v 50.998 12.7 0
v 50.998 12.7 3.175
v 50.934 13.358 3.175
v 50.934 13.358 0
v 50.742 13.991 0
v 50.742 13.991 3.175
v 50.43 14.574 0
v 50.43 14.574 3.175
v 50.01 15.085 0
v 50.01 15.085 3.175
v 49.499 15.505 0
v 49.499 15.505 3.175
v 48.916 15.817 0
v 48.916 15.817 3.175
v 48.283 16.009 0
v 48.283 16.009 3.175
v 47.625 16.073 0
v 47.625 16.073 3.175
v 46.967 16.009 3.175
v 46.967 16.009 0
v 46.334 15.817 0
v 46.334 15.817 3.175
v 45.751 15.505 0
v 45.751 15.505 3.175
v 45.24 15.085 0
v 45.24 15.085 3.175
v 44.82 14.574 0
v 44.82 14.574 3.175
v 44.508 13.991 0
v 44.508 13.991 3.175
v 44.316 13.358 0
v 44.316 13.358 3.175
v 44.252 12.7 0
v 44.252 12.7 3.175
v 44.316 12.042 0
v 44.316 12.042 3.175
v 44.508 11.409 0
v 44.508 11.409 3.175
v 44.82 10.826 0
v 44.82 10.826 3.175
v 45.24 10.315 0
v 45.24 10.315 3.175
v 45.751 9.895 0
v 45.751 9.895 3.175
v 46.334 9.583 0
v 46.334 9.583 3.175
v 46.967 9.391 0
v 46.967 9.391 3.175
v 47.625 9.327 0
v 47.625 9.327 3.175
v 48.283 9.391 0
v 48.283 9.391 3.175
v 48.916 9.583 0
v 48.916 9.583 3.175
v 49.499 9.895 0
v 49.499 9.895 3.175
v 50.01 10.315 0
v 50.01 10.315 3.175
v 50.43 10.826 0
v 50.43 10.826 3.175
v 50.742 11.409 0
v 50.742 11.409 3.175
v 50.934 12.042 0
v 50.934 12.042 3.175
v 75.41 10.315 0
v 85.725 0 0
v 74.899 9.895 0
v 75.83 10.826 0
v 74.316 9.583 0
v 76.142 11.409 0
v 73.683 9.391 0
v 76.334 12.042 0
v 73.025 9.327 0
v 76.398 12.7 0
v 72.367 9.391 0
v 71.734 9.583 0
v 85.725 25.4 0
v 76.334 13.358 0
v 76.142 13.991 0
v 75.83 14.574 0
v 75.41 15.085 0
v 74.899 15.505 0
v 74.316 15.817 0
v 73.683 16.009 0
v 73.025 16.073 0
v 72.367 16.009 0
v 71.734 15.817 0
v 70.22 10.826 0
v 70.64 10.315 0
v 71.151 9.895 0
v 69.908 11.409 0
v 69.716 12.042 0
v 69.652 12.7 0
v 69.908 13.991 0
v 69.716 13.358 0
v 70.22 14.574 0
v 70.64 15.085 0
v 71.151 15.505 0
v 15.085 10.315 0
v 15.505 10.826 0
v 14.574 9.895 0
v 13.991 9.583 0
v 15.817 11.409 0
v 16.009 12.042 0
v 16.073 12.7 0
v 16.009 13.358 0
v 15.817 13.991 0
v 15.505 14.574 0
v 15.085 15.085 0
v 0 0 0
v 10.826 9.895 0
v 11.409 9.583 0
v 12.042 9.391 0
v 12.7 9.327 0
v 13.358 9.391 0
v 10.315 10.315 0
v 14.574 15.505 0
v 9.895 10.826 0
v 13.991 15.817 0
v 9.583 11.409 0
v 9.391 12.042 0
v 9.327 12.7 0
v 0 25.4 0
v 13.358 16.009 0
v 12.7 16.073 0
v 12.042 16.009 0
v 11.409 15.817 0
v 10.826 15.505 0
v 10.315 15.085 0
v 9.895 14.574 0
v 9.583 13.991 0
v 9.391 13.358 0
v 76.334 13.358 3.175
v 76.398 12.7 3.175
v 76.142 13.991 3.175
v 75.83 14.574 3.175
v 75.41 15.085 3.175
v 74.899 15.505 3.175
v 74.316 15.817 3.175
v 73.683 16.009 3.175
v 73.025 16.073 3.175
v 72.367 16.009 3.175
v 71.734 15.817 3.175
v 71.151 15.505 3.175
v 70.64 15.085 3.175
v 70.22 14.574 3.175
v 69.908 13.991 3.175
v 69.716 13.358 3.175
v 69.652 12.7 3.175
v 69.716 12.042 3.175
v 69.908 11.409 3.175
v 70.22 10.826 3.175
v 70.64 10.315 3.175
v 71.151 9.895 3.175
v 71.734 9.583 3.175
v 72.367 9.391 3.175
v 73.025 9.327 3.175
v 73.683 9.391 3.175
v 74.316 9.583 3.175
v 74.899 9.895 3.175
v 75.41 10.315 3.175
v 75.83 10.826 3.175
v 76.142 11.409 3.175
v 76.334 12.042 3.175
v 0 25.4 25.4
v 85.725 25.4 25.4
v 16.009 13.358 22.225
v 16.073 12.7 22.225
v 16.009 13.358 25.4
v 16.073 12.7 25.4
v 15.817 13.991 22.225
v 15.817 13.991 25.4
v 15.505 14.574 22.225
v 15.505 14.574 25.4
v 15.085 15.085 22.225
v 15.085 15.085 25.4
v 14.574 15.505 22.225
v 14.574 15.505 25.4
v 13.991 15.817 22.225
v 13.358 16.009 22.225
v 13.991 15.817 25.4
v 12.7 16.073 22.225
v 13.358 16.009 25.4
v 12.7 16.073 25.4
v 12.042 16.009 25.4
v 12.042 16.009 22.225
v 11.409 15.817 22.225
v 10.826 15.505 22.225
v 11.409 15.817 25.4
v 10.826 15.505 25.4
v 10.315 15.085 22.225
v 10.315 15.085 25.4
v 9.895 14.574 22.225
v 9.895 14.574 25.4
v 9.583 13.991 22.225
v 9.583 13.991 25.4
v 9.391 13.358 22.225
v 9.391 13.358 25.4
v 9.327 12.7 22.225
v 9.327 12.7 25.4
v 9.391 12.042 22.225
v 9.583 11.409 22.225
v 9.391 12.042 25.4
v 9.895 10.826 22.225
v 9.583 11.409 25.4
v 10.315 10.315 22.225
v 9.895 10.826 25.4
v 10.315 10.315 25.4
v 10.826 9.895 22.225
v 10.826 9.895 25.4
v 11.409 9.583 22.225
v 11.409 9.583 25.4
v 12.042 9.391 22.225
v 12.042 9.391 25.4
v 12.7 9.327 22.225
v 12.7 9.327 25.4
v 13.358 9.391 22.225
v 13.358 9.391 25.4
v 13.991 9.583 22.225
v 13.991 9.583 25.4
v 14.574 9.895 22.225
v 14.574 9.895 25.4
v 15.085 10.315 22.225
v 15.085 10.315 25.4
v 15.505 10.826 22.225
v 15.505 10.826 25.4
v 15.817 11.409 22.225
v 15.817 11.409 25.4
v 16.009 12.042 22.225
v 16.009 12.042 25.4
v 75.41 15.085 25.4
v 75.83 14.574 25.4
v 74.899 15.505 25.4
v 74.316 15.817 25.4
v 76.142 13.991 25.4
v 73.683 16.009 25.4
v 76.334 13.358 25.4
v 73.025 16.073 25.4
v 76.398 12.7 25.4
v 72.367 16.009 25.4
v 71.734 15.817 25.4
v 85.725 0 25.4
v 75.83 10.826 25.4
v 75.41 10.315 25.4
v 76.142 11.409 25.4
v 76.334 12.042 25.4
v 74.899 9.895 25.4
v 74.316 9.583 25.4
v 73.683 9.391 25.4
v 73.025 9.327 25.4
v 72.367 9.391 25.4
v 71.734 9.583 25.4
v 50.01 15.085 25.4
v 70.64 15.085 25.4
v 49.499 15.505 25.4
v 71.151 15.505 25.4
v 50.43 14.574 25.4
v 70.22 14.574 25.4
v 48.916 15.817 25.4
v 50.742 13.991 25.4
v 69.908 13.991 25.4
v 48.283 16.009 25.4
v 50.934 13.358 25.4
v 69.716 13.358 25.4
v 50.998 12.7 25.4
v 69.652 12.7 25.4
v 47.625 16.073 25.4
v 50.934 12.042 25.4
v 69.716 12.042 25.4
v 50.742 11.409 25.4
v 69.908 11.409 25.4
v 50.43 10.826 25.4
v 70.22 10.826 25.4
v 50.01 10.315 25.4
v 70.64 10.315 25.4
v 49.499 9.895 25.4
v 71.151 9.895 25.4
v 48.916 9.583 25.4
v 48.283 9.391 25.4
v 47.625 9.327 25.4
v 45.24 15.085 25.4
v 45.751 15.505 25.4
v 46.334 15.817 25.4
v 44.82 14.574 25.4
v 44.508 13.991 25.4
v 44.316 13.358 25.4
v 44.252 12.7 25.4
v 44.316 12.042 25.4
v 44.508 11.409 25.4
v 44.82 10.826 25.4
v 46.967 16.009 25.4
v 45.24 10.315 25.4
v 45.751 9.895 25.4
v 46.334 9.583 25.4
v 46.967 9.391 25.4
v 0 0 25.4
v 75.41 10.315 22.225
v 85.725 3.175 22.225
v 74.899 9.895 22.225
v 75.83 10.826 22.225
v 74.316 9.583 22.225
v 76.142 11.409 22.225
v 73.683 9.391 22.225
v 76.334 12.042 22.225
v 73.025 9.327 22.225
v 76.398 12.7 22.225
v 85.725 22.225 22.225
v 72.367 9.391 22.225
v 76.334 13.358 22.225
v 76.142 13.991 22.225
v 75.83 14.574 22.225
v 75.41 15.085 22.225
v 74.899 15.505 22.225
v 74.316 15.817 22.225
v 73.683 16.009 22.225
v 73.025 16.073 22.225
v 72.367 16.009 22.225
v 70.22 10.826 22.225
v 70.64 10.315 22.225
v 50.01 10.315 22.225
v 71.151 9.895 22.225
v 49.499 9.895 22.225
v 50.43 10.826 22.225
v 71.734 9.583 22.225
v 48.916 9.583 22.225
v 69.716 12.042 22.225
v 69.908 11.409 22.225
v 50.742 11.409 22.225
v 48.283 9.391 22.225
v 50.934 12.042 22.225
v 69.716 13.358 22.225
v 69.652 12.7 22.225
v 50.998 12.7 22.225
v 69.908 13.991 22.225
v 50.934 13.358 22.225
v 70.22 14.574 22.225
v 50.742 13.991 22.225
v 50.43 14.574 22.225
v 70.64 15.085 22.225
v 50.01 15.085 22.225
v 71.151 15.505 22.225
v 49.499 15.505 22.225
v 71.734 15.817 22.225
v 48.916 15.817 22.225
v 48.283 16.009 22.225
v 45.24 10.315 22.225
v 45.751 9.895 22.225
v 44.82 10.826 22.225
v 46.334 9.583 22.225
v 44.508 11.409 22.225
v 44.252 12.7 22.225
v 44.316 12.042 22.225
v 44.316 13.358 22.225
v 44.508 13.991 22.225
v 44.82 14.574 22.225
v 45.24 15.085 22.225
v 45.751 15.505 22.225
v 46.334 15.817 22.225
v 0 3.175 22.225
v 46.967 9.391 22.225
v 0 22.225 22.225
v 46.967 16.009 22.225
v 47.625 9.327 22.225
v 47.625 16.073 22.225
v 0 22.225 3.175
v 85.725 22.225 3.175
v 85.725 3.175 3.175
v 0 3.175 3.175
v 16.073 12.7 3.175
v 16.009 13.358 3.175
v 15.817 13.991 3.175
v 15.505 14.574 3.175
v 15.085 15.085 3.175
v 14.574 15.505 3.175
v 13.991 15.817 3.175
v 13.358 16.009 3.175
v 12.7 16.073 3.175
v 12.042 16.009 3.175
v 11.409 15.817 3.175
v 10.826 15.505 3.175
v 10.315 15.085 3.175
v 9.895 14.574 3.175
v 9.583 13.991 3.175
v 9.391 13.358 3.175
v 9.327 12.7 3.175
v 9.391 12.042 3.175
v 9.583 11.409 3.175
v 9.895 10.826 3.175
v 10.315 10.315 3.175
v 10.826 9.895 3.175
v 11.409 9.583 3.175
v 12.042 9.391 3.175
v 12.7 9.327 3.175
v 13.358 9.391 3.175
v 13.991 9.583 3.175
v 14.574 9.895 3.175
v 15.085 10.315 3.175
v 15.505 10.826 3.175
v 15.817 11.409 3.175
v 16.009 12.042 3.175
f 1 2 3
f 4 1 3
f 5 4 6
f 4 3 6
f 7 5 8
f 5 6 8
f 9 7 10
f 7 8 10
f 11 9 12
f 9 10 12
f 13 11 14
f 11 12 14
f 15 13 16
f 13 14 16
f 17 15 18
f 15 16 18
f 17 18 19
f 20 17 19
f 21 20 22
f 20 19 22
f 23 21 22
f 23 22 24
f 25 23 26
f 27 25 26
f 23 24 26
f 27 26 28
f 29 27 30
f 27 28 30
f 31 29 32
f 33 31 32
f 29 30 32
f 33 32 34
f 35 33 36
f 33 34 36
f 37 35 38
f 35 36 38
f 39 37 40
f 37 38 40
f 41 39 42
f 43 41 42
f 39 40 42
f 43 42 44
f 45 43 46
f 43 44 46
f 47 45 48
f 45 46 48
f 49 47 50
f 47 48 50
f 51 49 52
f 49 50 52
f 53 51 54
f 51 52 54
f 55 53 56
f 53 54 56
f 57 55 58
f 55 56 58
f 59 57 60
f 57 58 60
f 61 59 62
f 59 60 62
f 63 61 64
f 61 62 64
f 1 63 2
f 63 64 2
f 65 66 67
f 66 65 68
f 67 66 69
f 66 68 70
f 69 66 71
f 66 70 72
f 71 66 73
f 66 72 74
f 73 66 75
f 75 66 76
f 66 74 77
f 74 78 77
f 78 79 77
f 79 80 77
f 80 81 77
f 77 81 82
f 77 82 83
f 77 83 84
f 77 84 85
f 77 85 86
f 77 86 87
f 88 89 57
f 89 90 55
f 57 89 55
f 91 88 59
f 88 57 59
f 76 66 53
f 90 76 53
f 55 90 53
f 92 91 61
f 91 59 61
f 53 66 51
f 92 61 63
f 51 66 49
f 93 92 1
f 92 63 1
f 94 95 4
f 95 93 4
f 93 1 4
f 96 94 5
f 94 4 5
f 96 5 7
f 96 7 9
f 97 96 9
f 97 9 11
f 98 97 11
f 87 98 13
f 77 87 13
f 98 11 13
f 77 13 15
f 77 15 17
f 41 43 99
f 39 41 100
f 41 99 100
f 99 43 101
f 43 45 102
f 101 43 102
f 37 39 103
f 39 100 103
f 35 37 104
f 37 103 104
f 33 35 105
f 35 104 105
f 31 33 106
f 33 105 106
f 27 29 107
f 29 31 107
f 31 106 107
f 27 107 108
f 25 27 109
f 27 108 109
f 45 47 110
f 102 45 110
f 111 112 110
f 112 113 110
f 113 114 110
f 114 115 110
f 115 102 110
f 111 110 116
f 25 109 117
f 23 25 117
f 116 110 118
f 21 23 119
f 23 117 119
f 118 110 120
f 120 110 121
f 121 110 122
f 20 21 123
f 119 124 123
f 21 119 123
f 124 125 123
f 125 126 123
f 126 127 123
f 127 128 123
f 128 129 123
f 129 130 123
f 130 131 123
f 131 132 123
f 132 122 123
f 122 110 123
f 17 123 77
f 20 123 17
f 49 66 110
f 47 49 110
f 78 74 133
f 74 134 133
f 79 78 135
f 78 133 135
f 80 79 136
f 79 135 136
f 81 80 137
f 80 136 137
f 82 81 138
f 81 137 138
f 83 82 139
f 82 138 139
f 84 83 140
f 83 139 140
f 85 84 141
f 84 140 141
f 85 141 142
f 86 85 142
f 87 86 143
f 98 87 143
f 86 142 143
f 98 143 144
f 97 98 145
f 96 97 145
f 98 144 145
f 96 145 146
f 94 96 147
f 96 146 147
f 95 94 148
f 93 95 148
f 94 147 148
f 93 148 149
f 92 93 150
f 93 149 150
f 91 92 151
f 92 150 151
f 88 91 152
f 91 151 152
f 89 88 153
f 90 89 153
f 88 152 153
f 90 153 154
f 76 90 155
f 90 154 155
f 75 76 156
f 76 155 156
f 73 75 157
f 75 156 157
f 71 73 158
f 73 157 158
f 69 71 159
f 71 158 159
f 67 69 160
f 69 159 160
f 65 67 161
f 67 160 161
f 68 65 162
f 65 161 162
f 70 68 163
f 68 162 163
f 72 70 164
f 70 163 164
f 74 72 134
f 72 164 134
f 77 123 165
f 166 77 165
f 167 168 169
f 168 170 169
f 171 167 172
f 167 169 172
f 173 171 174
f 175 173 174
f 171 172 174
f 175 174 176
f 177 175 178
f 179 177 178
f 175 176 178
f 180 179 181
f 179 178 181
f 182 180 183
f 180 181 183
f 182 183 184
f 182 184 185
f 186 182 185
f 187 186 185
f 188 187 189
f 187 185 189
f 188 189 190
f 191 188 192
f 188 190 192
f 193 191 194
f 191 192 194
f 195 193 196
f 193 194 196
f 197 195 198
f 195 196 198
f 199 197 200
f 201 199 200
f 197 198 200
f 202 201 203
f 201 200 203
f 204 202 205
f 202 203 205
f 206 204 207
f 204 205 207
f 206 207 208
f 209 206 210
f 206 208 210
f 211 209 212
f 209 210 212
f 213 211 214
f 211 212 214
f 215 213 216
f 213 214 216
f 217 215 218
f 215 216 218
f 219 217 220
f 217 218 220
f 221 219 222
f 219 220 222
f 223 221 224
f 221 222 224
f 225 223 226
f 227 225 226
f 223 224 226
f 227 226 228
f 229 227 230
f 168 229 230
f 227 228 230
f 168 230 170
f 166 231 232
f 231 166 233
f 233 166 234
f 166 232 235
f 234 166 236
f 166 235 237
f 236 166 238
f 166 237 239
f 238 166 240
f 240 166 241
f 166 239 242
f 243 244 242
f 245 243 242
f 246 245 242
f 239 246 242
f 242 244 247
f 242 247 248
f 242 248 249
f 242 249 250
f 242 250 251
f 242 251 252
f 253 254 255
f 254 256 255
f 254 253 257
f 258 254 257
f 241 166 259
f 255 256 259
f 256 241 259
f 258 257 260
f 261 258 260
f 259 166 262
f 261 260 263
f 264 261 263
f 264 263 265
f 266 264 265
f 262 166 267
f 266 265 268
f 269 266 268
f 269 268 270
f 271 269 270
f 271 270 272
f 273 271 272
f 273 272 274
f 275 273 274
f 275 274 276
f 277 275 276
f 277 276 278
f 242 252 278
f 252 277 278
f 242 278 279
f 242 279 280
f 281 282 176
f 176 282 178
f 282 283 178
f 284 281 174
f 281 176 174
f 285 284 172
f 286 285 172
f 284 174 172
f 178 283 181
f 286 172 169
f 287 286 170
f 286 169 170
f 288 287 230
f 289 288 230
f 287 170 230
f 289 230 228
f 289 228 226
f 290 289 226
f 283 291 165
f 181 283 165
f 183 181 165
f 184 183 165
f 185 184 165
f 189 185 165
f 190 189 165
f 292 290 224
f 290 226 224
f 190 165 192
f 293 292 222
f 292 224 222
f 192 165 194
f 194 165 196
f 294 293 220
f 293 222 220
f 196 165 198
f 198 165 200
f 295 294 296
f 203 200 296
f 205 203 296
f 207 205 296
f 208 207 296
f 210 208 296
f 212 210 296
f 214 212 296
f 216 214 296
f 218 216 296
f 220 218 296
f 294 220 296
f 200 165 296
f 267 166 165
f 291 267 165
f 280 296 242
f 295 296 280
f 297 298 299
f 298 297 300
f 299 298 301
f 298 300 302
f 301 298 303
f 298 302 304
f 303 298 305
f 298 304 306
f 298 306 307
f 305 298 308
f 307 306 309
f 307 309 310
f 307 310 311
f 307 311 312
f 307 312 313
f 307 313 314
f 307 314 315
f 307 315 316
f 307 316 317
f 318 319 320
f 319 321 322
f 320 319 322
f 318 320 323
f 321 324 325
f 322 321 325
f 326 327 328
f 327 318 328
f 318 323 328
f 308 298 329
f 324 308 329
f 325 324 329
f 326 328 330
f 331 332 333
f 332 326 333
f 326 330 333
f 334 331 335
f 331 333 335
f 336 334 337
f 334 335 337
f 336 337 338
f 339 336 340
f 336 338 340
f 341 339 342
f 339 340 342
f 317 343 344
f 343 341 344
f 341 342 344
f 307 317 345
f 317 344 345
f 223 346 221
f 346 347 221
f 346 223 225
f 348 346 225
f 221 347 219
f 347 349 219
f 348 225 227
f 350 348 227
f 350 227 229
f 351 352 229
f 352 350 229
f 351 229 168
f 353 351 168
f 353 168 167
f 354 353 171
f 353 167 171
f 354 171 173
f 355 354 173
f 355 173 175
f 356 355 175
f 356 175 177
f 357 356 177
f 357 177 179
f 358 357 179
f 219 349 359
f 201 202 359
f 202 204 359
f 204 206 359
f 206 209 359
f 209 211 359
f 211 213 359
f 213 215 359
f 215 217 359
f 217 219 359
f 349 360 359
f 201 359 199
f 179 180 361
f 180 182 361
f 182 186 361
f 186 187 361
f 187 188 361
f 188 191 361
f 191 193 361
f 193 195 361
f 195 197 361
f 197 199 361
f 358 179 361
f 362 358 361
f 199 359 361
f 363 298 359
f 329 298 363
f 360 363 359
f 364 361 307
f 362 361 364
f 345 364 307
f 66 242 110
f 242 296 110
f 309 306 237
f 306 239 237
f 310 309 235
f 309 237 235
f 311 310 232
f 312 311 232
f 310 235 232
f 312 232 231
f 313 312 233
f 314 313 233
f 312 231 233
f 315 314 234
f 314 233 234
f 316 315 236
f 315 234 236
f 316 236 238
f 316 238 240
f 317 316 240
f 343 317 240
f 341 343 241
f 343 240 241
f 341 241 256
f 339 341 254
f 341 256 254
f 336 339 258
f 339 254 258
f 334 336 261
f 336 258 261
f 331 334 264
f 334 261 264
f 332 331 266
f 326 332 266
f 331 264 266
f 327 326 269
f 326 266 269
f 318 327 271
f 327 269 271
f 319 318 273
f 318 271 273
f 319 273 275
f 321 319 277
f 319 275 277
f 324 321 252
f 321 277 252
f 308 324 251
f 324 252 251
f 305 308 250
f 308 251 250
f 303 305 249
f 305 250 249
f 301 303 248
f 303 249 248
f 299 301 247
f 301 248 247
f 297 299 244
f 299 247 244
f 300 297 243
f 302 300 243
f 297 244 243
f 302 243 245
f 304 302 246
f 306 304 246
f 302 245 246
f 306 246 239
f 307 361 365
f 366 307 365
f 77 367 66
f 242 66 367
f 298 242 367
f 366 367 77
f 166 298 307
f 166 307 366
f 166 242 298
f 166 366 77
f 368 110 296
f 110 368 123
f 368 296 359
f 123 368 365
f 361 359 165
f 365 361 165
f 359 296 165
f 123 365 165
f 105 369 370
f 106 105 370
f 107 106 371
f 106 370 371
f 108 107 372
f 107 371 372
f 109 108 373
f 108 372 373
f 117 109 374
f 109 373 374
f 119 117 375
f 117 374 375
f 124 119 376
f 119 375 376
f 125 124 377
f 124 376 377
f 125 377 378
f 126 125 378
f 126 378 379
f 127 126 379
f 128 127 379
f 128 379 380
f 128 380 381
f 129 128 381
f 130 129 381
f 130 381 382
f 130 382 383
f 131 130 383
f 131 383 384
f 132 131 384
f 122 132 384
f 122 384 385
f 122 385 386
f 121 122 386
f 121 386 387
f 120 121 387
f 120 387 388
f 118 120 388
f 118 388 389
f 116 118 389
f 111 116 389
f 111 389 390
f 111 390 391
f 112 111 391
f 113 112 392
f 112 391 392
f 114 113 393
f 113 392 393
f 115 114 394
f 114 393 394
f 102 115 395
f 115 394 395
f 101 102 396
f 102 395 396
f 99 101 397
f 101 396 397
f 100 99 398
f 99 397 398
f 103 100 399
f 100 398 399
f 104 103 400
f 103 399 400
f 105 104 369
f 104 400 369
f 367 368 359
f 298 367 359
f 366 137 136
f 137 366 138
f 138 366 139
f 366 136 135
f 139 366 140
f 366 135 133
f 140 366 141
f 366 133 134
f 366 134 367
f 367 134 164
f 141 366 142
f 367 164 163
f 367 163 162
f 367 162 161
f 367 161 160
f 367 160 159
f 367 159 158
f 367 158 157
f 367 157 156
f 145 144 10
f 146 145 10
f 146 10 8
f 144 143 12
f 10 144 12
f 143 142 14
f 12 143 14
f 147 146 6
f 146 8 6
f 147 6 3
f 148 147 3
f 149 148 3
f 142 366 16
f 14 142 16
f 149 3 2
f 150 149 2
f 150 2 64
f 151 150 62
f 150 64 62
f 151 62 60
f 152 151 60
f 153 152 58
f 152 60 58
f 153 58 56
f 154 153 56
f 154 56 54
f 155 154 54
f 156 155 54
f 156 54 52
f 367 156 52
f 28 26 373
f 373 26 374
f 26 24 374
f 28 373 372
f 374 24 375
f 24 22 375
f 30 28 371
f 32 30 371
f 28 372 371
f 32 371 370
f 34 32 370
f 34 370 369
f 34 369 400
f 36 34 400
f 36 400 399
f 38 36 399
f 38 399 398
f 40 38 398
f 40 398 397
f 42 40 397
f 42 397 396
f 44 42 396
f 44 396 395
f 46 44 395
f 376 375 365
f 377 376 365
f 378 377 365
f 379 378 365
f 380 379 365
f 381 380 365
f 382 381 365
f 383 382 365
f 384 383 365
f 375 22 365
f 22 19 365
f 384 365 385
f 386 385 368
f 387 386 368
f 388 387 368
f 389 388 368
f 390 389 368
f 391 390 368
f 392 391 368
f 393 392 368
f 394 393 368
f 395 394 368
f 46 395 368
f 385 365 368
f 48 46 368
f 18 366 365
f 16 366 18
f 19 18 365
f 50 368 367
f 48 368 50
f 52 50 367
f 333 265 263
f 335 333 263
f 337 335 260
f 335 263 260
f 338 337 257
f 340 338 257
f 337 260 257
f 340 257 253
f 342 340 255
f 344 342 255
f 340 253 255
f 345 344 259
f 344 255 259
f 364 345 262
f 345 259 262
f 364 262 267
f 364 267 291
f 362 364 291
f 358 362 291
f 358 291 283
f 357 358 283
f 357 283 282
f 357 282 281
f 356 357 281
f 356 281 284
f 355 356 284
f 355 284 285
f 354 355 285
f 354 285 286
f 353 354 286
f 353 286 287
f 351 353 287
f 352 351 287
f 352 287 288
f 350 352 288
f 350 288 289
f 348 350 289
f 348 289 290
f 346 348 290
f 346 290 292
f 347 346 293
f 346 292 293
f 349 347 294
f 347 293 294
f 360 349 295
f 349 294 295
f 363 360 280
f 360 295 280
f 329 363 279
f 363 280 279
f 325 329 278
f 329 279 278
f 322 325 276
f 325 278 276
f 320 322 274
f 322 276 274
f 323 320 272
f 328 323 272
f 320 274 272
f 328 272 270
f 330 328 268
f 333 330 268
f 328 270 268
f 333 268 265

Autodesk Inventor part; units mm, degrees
ref_plane "YZ Plane" through (0, 0, 0) normal (1, 0, 0) x (0, 1, 0)
ref_plane "XZ Plane" through (0, 0, 0) normal (0, 1, 0) x (-1, 0, 0)
ref_plane "XY Plane" through (0, 0, 0) normal (0, 0, 1) x (1, 0, 0)
sketch "Sketch1" plane through (0, 0, 0) normal (1, 0, 0) x (0, 1, 0)
  line L0 (0, 0) -> (25.4, 0)
  line L1 (25.4, 0) -> (25.4, 25.4)
  line L2 (25.4, 25.4) -> (0, 25.4)
  line L3 (0, 25.4) -> (0, 0)
  line L4 (3.175, 22.225) -> (22.225, 22.225)
  line L5 (22.225, 22.225) -> (22.225, 3.175)
  line L6 (22.225, 3.175) -> (3.175, 3.175)
  line L7 (3.175, 3.175) -> (3.175, 22.225)
  dimension "d0" = 25.4
  dimension "d1" = 25.4
  dimension "d2" = 3.175
extrude "Extrusion1" add sketch "Sketch1" along normal blind 85.725
sketch "Sketch2" plane through (0, 0, 25.4) normal (0, 0, 1) x (1, 0, 0)
  circle A0 centre (12.7, 12.7) radius 3.3734
  circle A1 centre (73.025, 12.7) radius 3.3734
  line L0 (85.725, 25.4) -> (85.725, 0) projected
  line L1 (0, 0) -> (85.725, 0) projected
  line L2 (0, 25.4) -> (0, 0) projected
  circle A2 centre (47.625, 12.7) radius 3.3734
  line L3 (0, 25.4) -> (85.725, 25.4) projected
  dimension "d5" = 6.7469
  dimension "d6" = 6.7469
  dimension "d7" = 12.7
  dimension "d8" = 12.7
  dimension "d9" = 12.7
  dimension "d10" = 12.7
  dimension "d13" = 6.7469
  dimension "d15" = 12.7
  dimension "d16" = 25.4
extrude "Extrusion2" cut sketch "Sketch2" against normal blind 25.4 contours A0 | A1 | A2
properties part number "support block 2"
